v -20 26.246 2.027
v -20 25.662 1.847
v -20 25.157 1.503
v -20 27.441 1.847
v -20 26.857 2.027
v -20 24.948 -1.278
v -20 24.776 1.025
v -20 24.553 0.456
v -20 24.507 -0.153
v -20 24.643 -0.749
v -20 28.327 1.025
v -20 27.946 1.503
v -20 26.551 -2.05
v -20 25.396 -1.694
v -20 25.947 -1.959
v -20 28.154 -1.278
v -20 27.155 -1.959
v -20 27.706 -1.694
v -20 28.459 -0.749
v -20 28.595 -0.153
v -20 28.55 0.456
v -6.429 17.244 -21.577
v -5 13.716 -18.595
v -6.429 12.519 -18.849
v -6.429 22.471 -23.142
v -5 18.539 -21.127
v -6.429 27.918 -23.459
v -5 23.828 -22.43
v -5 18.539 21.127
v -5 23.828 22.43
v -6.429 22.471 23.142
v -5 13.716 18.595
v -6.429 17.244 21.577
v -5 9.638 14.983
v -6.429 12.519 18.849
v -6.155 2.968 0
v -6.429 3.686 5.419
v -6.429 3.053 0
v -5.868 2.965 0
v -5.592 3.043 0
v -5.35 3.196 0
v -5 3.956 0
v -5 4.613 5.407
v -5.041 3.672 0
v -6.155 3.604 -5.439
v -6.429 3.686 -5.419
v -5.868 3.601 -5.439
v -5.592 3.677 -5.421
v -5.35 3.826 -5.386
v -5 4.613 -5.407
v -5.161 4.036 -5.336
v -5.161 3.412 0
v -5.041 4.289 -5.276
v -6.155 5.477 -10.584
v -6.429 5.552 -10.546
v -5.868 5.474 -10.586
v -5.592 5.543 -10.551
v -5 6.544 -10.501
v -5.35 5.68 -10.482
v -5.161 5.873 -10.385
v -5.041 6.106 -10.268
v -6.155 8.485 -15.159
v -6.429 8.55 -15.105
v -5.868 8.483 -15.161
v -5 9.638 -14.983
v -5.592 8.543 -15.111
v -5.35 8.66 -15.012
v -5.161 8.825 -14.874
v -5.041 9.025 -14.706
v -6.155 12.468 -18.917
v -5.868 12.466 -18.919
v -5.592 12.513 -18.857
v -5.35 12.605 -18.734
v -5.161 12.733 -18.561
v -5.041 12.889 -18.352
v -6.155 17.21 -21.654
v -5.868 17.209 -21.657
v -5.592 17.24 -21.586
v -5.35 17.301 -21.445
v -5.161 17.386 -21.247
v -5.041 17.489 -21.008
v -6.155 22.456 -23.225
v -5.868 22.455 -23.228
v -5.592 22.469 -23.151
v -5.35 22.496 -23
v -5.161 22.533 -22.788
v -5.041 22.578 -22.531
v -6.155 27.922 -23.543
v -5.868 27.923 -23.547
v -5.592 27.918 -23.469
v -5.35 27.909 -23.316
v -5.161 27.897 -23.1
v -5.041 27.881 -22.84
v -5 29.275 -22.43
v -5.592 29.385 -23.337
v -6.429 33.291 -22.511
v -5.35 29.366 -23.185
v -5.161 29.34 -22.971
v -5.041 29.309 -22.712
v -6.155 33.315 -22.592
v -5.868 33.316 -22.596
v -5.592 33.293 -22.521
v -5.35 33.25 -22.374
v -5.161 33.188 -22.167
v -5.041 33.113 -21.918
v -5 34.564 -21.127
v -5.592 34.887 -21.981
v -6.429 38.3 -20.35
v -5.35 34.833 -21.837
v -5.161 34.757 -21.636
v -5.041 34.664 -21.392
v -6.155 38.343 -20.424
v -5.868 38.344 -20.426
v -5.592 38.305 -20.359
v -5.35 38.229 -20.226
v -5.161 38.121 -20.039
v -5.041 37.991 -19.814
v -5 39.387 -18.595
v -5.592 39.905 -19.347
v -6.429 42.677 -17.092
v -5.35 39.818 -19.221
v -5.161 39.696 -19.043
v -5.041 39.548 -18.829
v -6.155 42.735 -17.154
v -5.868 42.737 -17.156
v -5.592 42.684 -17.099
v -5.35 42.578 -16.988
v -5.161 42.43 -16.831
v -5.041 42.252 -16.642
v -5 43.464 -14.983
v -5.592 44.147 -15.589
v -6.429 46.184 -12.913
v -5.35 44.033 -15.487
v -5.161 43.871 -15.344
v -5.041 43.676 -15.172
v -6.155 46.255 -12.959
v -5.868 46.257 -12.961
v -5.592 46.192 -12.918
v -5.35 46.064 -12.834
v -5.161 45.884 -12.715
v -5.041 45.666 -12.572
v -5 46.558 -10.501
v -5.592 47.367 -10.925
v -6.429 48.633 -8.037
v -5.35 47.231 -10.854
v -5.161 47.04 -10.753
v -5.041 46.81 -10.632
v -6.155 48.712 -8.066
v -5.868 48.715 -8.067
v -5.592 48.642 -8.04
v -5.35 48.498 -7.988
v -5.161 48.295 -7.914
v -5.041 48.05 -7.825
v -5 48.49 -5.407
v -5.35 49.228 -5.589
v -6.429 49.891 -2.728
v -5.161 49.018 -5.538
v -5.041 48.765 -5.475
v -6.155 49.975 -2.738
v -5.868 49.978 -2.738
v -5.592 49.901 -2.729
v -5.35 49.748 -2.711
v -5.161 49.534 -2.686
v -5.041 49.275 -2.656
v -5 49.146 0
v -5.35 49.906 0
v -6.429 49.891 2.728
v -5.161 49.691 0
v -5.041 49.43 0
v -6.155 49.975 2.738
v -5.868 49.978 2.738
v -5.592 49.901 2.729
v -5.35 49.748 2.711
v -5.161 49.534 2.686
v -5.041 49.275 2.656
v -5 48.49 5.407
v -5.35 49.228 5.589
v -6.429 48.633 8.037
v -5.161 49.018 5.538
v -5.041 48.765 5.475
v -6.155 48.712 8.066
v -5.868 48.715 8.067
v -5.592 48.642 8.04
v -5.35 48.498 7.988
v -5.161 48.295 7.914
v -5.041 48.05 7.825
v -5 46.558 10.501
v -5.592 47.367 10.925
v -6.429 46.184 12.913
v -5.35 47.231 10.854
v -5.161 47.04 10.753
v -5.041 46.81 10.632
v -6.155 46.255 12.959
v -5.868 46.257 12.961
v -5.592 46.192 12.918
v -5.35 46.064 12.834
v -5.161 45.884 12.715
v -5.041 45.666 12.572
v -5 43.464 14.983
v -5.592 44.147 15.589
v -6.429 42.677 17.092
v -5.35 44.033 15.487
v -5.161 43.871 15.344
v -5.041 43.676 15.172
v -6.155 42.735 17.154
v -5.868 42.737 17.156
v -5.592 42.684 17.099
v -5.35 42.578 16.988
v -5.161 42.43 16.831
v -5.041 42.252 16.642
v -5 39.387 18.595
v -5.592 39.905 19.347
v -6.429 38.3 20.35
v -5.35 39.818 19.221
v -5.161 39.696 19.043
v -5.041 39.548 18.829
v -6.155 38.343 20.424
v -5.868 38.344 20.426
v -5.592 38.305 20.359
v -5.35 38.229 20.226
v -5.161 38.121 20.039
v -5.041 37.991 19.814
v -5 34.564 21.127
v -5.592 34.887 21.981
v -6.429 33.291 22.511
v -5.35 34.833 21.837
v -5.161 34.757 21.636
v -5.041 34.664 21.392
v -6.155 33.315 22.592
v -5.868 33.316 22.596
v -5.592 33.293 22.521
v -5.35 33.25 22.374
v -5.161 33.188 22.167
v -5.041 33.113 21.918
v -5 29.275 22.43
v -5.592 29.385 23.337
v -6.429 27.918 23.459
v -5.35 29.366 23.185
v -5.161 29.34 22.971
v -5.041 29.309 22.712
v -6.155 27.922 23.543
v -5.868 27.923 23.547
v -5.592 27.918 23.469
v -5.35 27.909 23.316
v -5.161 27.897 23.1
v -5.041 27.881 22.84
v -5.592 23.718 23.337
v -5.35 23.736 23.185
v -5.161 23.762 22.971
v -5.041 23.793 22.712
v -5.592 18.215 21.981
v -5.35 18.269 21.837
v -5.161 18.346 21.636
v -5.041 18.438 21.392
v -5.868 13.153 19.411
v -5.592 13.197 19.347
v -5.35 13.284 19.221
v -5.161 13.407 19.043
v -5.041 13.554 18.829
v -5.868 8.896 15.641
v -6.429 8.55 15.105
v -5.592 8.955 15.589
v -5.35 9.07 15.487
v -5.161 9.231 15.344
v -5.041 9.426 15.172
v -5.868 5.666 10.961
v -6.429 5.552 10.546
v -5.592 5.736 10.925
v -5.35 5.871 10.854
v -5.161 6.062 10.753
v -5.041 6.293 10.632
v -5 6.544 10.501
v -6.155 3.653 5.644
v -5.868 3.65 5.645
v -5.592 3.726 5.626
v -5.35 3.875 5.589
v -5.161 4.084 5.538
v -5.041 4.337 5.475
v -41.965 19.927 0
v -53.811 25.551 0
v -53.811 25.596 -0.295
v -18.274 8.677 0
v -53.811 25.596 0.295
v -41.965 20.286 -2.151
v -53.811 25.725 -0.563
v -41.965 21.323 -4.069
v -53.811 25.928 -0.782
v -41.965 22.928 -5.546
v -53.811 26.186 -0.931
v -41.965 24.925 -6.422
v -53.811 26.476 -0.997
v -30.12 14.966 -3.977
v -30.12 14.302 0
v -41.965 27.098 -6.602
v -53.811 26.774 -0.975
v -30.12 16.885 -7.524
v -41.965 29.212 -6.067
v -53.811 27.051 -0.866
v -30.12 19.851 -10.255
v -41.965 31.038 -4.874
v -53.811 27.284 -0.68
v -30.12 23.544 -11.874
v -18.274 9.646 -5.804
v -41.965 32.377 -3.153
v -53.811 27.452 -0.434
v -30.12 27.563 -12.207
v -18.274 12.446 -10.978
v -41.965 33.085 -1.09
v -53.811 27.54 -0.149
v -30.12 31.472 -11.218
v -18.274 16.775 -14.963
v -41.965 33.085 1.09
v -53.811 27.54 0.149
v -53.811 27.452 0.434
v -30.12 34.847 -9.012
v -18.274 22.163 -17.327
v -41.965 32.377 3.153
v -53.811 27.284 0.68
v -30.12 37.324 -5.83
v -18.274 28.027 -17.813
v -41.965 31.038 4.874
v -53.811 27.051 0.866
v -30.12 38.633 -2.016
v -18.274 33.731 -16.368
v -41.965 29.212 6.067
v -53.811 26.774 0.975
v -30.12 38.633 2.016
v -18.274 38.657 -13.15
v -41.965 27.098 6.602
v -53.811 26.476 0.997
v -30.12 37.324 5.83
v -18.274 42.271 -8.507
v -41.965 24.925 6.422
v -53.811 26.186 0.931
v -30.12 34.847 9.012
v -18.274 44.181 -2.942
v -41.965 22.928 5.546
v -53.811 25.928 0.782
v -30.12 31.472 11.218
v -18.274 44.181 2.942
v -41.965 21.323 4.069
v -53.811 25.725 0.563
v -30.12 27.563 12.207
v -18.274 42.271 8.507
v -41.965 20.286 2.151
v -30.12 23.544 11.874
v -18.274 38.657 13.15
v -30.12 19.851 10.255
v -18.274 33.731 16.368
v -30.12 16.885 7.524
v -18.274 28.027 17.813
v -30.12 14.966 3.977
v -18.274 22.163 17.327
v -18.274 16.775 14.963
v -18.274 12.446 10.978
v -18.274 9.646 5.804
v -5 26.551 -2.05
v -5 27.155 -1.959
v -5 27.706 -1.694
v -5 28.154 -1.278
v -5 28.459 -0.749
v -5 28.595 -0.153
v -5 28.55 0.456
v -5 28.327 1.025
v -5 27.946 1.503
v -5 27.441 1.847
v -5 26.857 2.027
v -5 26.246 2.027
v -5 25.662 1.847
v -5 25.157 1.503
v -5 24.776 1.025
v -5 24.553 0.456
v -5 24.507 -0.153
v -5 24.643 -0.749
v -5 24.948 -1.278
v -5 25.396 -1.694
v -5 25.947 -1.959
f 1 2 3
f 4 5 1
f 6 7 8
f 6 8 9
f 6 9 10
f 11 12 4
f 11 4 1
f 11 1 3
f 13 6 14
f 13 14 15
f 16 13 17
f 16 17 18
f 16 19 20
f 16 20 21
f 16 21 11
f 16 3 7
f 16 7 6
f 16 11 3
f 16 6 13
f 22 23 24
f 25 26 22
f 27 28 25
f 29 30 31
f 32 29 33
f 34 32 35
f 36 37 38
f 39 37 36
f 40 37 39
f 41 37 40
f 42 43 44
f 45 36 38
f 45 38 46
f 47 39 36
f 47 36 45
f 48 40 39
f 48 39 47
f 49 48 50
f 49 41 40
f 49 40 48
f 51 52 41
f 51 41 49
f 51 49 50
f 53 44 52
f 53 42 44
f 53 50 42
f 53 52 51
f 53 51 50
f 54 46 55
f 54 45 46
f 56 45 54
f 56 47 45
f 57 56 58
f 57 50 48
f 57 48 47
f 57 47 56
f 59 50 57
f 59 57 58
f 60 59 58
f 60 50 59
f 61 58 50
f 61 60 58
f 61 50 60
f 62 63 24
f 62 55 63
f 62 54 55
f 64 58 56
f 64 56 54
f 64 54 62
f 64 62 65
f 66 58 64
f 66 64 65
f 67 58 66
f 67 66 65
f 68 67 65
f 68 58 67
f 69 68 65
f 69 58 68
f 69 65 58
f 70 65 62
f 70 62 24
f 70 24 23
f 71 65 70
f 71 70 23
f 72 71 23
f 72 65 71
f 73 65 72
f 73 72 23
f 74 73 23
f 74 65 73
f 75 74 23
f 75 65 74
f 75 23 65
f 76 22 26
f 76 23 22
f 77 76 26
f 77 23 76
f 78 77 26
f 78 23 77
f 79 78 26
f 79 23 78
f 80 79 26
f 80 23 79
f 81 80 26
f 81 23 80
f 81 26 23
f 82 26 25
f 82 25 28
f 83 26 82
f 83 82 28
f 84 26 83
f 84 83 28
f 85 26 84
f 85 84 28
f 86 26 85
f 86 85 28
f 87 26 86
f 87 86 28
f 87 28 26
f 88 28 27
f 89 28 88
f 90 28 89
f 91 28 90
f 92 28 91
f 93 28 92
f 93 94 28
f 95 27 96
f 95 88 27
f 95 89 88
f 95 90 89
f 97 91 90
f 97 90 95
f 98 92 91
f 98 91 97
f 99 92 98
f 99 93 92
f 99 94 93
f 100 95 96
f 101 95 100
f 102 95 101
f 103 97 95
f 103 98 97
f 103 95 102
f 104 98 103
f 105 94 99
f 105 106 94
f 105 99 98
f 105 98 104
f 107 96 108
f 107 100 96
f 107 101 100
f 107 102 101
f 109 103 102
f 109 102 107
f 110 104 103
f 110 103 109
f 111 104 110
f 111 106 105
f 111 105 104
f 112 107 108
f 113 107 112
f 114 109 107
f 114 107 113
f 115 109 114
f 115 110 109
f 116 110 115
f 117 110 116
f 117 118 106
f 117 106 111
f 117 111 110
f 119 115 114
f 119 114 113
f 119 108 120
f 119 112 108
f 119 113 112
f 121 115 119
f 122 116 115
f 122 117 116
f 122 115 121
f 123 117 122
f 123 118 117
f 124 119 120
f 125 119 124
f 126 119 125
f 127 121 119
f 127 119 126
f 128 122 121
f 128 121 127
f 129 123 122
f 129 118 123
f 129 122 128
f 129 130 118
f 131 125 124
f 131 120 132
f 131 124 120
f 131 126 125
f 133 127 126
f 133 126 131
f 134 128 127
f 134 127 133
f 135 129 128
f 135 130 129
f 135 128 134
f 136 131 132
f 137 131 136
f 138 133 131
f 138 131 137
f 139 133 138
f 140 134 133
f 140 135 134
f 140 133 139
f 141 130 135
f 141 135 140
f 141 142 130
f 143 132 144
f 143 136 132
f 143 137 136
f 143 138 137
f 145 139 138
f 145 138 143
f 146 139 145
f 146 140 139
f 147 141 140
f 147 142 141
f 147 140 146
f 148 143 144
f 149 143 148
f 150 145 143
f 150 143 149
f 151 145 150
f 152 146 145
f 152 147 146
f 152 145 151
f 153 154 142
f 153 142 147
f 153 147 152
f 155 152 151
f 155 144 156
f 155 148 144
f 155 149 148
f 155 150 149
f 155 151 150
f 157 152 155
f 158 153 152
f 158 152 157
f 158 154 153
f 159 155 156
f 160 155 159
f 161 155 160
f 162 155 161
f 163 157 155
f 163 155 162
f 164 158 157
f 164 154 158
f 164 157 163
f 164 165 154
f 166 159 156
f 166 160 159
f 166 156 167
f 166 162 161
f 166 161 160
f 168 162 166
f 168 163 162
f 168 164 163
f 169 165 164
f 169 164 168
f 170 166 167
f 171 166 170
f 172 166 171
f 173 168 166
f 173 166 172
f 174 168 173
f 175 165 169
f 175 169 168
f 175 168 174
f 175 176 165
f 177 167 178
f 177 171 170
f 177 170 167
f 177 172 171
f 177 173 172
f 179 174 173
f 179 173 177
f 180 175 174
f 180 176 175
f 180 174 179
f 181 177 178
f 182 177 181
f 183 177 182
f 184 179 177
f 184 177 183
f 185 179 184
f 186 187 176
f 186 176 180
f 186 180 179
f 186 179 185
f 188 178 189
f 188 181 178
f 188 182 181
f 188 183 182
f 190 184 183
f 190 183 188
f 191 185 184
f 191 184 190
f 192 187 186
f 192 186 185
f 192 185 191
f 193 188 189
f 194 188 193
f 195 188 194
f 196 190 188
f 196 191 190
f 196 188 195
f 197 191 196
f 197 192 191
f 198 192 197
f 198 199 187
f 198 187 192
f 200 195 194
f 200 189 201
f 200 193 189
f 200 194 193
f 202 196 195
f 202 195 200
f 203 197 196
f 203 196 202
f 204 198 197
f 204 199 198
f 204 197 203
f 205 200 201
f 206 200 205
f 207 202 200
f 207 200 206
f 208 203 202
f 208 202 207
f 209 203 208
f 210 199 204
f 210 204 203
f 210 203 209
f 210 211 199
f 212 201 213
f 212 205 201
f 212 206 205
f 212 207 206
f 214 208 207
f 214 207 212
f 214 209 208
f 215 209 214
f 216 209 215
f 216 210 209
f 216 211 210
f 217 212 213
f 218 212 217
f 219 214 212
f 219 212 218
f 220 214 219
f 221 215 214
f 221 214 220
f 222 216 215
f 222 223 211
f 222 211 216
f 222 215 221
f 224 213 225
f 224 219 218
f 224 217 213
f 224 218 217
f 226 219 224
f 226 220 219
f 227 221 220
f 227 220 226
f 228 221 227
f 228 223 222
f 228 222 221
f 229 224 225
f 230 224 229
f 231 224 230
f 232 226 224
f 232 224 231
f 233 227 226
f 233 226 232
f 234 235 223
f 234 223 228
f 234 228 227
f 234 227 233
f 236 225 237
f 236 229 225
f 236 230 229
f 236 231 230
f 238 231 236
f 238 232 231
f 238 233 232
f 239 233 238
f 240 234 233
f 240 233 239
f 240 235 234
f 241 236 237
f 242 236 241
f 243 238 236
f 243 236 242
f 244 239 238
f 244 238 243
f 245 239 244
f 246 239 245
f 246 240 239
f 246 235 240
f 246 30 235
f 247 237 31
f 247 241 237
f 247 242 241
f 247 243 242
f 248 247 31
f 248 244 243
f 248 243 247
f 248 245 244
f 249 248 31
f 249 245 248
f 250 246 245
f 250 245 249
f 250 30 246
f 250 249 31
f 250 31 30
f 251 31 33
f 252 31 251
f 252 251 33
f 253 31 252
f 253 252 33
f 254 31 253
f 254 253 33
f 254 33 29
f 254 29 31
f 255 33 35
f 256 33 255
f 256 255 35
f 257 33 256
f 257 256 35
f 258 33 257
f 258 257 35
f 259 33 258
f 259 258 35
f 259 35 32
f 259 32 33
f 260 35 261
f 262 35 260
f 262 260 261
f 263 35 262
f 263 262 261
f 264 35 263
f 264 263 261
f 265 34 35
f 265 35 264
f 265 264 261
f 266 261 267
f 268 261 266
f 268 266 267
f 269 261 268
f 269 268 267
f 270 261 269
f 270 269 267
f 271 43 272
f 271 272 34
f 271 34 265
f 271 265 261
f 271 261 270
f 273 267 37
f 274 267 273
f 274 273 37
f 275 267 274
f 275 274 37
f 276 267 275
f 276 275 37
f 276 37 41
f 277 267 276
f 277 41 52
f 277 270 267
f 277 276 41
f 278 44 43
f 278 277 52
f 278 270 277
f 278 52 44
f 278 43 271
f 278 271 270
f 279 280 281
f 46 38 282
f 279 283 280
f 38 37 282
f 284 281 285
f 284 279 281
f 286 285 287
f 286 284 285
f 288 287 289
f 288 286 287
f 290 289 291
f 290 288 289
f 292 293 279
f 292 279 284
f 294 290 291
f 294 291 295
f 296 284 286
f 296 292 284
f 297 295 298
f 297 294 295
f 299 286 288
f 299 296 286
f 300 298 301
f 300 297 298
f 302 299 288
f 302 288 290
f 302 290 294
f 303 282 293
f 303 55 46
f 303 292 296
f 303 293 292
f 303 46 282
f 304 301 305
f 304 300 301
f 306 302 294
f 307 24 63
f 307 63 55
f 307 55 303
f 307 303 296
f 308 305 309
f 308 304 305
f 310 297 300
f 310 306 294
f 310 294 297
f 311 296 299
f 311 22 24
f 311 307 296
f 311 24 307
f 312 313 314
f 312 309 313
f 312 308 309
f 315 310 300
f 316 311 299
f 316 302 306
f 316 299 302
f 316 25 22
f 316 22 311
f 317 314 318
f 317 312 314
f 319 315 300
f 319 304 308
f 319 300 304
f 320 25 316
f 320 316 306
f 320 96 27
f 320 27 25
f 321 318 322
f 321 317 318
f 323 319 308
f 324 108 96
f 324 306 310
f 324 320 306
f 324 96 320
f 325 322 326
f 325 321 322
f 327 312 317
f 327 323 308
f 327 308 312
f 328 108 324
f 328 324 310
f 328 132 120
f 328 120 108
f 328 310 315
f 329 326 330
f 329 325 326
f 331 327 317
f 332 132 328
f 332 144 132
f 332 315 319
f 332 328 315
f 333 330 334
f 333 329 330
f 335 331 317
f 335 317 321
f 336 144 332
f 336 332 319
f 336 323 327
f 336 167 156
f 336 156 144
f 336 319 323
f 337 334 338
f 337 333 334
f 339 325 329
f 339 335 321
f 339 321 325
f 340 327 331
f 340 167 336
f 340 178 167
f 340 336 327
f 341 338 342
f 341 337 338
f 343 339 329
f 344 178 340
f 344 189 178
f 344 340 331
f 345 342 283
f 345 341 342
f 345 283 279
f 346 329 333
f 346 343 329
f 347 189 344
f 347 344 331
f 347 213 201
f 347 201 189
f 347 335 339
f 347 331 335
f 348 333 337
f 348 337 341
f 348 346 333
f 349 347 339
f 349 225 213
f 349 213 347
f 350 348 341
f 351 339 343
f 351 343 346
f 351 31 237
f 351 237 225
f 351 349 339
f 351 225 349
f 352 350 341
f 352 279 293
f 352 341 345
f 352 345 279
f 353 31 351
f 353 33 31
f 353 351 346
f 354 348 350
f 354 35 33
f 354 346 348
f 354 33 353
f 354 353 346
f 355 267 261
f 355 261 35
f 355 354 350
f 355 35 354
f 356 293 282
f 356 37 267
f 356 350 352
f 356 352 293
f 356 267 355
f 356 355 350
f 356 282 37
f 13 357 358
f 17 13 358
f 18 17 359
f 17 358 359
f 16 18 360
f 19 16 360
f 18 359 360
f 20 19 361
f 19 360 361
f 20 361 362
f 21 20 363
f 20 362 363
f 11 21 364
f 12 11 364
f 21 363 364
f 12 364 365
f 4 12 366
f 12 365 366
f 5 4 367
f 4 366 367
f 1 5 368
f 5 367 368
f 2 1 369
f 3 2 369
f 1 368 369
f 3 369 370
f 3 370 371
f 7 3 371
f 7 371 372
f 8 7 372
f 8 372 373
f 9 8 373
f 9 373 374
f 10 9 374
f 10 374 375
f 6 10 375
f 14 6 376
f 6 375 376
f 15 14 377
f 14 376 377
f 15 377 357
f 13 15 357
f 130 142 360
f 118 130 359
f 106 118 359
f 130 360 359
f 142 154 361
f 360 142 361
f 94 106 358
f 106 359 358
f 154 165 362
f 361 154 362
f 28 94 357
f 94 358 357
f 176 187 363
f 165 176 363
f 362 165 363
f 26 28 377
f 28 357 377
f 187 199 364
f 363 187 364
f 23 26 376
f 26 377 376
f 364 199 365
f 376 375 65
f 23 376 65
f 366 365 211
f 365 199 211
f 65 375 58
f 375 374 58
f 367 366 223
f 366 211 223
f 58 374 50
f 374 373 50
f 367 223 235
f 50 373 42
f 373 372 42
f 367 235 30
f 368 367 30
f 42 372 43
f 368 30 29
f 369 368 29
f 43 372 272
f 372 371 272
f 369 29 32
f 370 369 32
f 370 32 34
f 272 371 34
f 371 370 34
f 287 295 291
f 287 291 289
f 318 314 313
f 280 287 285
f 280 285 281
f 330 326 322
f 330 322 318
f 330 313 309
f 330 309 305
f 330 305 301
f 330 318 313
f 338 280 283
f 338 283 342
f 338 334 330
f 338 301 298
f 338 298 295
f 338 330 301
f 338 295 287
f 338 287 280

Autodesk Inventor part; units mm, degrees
ref_plane "YZ Plane" through (0, 0, 0) normal (1, 0, 0) x (0, 1, 0)
ref_plane "XZ Plane" through (0, 0, 0) normal (0, 1, 0) x (-1, 0, 0)
ref_plane "XY Plane" through (0, 0, 0) normal (0, 0, 1) x (1, 0, 0)
sketch "Sketch1" plane through (0, 0, 0) normal (0, 0, 1) x (1, 0, 0)
  line L0 (0, 0) -> (0, 26.5512)
  line L1 (0, 26.5512) -> (-55.9167, 26.5512)
  line L2 (-55.9167, 26.5512) -> (0, 0)
  line L3 (-53.8107, 26.5512) -> (-53.8107, 25.5512)
  line L4 (-5, 26.5512) -> (-5, 2.3742)
  dimension "d15" = 1
  dimension "d16" = 5
  dimension "r" = 26.5512
  dimension "d18" = 25.4
  dimension "d19" = 48.8107
revolve "Revolution1" add sketch "Sketch1" angle 360 about axis through (0, 26.5512, 0) along (-1, 0, 0) contours L2 L3 L1 L4
fillet "Fillet1" radius 1 1 edges at (-5, 50.7282, 0)
sketch "Sketch2" plane through (-5, 26.5512, 0) normal (1, 0, 0) x (0, 0, -1)
  circle A0 centre (0, 0) radius 2.05
  circle A1 centre (0, 0) radius 22.5952 projected
  point P0 (0, -26.5512)
  dimension "d7" = 4.1
extrude "Extrusion1" cut sketch "Sketch2" against normal blind 15 contours A0
equation "\"d7\" = dowel + dowelgap"
equation "\"dowel\" = 4"
equation "\"dowelgap\" = 0.1"
properties part number "cone-fixed"
